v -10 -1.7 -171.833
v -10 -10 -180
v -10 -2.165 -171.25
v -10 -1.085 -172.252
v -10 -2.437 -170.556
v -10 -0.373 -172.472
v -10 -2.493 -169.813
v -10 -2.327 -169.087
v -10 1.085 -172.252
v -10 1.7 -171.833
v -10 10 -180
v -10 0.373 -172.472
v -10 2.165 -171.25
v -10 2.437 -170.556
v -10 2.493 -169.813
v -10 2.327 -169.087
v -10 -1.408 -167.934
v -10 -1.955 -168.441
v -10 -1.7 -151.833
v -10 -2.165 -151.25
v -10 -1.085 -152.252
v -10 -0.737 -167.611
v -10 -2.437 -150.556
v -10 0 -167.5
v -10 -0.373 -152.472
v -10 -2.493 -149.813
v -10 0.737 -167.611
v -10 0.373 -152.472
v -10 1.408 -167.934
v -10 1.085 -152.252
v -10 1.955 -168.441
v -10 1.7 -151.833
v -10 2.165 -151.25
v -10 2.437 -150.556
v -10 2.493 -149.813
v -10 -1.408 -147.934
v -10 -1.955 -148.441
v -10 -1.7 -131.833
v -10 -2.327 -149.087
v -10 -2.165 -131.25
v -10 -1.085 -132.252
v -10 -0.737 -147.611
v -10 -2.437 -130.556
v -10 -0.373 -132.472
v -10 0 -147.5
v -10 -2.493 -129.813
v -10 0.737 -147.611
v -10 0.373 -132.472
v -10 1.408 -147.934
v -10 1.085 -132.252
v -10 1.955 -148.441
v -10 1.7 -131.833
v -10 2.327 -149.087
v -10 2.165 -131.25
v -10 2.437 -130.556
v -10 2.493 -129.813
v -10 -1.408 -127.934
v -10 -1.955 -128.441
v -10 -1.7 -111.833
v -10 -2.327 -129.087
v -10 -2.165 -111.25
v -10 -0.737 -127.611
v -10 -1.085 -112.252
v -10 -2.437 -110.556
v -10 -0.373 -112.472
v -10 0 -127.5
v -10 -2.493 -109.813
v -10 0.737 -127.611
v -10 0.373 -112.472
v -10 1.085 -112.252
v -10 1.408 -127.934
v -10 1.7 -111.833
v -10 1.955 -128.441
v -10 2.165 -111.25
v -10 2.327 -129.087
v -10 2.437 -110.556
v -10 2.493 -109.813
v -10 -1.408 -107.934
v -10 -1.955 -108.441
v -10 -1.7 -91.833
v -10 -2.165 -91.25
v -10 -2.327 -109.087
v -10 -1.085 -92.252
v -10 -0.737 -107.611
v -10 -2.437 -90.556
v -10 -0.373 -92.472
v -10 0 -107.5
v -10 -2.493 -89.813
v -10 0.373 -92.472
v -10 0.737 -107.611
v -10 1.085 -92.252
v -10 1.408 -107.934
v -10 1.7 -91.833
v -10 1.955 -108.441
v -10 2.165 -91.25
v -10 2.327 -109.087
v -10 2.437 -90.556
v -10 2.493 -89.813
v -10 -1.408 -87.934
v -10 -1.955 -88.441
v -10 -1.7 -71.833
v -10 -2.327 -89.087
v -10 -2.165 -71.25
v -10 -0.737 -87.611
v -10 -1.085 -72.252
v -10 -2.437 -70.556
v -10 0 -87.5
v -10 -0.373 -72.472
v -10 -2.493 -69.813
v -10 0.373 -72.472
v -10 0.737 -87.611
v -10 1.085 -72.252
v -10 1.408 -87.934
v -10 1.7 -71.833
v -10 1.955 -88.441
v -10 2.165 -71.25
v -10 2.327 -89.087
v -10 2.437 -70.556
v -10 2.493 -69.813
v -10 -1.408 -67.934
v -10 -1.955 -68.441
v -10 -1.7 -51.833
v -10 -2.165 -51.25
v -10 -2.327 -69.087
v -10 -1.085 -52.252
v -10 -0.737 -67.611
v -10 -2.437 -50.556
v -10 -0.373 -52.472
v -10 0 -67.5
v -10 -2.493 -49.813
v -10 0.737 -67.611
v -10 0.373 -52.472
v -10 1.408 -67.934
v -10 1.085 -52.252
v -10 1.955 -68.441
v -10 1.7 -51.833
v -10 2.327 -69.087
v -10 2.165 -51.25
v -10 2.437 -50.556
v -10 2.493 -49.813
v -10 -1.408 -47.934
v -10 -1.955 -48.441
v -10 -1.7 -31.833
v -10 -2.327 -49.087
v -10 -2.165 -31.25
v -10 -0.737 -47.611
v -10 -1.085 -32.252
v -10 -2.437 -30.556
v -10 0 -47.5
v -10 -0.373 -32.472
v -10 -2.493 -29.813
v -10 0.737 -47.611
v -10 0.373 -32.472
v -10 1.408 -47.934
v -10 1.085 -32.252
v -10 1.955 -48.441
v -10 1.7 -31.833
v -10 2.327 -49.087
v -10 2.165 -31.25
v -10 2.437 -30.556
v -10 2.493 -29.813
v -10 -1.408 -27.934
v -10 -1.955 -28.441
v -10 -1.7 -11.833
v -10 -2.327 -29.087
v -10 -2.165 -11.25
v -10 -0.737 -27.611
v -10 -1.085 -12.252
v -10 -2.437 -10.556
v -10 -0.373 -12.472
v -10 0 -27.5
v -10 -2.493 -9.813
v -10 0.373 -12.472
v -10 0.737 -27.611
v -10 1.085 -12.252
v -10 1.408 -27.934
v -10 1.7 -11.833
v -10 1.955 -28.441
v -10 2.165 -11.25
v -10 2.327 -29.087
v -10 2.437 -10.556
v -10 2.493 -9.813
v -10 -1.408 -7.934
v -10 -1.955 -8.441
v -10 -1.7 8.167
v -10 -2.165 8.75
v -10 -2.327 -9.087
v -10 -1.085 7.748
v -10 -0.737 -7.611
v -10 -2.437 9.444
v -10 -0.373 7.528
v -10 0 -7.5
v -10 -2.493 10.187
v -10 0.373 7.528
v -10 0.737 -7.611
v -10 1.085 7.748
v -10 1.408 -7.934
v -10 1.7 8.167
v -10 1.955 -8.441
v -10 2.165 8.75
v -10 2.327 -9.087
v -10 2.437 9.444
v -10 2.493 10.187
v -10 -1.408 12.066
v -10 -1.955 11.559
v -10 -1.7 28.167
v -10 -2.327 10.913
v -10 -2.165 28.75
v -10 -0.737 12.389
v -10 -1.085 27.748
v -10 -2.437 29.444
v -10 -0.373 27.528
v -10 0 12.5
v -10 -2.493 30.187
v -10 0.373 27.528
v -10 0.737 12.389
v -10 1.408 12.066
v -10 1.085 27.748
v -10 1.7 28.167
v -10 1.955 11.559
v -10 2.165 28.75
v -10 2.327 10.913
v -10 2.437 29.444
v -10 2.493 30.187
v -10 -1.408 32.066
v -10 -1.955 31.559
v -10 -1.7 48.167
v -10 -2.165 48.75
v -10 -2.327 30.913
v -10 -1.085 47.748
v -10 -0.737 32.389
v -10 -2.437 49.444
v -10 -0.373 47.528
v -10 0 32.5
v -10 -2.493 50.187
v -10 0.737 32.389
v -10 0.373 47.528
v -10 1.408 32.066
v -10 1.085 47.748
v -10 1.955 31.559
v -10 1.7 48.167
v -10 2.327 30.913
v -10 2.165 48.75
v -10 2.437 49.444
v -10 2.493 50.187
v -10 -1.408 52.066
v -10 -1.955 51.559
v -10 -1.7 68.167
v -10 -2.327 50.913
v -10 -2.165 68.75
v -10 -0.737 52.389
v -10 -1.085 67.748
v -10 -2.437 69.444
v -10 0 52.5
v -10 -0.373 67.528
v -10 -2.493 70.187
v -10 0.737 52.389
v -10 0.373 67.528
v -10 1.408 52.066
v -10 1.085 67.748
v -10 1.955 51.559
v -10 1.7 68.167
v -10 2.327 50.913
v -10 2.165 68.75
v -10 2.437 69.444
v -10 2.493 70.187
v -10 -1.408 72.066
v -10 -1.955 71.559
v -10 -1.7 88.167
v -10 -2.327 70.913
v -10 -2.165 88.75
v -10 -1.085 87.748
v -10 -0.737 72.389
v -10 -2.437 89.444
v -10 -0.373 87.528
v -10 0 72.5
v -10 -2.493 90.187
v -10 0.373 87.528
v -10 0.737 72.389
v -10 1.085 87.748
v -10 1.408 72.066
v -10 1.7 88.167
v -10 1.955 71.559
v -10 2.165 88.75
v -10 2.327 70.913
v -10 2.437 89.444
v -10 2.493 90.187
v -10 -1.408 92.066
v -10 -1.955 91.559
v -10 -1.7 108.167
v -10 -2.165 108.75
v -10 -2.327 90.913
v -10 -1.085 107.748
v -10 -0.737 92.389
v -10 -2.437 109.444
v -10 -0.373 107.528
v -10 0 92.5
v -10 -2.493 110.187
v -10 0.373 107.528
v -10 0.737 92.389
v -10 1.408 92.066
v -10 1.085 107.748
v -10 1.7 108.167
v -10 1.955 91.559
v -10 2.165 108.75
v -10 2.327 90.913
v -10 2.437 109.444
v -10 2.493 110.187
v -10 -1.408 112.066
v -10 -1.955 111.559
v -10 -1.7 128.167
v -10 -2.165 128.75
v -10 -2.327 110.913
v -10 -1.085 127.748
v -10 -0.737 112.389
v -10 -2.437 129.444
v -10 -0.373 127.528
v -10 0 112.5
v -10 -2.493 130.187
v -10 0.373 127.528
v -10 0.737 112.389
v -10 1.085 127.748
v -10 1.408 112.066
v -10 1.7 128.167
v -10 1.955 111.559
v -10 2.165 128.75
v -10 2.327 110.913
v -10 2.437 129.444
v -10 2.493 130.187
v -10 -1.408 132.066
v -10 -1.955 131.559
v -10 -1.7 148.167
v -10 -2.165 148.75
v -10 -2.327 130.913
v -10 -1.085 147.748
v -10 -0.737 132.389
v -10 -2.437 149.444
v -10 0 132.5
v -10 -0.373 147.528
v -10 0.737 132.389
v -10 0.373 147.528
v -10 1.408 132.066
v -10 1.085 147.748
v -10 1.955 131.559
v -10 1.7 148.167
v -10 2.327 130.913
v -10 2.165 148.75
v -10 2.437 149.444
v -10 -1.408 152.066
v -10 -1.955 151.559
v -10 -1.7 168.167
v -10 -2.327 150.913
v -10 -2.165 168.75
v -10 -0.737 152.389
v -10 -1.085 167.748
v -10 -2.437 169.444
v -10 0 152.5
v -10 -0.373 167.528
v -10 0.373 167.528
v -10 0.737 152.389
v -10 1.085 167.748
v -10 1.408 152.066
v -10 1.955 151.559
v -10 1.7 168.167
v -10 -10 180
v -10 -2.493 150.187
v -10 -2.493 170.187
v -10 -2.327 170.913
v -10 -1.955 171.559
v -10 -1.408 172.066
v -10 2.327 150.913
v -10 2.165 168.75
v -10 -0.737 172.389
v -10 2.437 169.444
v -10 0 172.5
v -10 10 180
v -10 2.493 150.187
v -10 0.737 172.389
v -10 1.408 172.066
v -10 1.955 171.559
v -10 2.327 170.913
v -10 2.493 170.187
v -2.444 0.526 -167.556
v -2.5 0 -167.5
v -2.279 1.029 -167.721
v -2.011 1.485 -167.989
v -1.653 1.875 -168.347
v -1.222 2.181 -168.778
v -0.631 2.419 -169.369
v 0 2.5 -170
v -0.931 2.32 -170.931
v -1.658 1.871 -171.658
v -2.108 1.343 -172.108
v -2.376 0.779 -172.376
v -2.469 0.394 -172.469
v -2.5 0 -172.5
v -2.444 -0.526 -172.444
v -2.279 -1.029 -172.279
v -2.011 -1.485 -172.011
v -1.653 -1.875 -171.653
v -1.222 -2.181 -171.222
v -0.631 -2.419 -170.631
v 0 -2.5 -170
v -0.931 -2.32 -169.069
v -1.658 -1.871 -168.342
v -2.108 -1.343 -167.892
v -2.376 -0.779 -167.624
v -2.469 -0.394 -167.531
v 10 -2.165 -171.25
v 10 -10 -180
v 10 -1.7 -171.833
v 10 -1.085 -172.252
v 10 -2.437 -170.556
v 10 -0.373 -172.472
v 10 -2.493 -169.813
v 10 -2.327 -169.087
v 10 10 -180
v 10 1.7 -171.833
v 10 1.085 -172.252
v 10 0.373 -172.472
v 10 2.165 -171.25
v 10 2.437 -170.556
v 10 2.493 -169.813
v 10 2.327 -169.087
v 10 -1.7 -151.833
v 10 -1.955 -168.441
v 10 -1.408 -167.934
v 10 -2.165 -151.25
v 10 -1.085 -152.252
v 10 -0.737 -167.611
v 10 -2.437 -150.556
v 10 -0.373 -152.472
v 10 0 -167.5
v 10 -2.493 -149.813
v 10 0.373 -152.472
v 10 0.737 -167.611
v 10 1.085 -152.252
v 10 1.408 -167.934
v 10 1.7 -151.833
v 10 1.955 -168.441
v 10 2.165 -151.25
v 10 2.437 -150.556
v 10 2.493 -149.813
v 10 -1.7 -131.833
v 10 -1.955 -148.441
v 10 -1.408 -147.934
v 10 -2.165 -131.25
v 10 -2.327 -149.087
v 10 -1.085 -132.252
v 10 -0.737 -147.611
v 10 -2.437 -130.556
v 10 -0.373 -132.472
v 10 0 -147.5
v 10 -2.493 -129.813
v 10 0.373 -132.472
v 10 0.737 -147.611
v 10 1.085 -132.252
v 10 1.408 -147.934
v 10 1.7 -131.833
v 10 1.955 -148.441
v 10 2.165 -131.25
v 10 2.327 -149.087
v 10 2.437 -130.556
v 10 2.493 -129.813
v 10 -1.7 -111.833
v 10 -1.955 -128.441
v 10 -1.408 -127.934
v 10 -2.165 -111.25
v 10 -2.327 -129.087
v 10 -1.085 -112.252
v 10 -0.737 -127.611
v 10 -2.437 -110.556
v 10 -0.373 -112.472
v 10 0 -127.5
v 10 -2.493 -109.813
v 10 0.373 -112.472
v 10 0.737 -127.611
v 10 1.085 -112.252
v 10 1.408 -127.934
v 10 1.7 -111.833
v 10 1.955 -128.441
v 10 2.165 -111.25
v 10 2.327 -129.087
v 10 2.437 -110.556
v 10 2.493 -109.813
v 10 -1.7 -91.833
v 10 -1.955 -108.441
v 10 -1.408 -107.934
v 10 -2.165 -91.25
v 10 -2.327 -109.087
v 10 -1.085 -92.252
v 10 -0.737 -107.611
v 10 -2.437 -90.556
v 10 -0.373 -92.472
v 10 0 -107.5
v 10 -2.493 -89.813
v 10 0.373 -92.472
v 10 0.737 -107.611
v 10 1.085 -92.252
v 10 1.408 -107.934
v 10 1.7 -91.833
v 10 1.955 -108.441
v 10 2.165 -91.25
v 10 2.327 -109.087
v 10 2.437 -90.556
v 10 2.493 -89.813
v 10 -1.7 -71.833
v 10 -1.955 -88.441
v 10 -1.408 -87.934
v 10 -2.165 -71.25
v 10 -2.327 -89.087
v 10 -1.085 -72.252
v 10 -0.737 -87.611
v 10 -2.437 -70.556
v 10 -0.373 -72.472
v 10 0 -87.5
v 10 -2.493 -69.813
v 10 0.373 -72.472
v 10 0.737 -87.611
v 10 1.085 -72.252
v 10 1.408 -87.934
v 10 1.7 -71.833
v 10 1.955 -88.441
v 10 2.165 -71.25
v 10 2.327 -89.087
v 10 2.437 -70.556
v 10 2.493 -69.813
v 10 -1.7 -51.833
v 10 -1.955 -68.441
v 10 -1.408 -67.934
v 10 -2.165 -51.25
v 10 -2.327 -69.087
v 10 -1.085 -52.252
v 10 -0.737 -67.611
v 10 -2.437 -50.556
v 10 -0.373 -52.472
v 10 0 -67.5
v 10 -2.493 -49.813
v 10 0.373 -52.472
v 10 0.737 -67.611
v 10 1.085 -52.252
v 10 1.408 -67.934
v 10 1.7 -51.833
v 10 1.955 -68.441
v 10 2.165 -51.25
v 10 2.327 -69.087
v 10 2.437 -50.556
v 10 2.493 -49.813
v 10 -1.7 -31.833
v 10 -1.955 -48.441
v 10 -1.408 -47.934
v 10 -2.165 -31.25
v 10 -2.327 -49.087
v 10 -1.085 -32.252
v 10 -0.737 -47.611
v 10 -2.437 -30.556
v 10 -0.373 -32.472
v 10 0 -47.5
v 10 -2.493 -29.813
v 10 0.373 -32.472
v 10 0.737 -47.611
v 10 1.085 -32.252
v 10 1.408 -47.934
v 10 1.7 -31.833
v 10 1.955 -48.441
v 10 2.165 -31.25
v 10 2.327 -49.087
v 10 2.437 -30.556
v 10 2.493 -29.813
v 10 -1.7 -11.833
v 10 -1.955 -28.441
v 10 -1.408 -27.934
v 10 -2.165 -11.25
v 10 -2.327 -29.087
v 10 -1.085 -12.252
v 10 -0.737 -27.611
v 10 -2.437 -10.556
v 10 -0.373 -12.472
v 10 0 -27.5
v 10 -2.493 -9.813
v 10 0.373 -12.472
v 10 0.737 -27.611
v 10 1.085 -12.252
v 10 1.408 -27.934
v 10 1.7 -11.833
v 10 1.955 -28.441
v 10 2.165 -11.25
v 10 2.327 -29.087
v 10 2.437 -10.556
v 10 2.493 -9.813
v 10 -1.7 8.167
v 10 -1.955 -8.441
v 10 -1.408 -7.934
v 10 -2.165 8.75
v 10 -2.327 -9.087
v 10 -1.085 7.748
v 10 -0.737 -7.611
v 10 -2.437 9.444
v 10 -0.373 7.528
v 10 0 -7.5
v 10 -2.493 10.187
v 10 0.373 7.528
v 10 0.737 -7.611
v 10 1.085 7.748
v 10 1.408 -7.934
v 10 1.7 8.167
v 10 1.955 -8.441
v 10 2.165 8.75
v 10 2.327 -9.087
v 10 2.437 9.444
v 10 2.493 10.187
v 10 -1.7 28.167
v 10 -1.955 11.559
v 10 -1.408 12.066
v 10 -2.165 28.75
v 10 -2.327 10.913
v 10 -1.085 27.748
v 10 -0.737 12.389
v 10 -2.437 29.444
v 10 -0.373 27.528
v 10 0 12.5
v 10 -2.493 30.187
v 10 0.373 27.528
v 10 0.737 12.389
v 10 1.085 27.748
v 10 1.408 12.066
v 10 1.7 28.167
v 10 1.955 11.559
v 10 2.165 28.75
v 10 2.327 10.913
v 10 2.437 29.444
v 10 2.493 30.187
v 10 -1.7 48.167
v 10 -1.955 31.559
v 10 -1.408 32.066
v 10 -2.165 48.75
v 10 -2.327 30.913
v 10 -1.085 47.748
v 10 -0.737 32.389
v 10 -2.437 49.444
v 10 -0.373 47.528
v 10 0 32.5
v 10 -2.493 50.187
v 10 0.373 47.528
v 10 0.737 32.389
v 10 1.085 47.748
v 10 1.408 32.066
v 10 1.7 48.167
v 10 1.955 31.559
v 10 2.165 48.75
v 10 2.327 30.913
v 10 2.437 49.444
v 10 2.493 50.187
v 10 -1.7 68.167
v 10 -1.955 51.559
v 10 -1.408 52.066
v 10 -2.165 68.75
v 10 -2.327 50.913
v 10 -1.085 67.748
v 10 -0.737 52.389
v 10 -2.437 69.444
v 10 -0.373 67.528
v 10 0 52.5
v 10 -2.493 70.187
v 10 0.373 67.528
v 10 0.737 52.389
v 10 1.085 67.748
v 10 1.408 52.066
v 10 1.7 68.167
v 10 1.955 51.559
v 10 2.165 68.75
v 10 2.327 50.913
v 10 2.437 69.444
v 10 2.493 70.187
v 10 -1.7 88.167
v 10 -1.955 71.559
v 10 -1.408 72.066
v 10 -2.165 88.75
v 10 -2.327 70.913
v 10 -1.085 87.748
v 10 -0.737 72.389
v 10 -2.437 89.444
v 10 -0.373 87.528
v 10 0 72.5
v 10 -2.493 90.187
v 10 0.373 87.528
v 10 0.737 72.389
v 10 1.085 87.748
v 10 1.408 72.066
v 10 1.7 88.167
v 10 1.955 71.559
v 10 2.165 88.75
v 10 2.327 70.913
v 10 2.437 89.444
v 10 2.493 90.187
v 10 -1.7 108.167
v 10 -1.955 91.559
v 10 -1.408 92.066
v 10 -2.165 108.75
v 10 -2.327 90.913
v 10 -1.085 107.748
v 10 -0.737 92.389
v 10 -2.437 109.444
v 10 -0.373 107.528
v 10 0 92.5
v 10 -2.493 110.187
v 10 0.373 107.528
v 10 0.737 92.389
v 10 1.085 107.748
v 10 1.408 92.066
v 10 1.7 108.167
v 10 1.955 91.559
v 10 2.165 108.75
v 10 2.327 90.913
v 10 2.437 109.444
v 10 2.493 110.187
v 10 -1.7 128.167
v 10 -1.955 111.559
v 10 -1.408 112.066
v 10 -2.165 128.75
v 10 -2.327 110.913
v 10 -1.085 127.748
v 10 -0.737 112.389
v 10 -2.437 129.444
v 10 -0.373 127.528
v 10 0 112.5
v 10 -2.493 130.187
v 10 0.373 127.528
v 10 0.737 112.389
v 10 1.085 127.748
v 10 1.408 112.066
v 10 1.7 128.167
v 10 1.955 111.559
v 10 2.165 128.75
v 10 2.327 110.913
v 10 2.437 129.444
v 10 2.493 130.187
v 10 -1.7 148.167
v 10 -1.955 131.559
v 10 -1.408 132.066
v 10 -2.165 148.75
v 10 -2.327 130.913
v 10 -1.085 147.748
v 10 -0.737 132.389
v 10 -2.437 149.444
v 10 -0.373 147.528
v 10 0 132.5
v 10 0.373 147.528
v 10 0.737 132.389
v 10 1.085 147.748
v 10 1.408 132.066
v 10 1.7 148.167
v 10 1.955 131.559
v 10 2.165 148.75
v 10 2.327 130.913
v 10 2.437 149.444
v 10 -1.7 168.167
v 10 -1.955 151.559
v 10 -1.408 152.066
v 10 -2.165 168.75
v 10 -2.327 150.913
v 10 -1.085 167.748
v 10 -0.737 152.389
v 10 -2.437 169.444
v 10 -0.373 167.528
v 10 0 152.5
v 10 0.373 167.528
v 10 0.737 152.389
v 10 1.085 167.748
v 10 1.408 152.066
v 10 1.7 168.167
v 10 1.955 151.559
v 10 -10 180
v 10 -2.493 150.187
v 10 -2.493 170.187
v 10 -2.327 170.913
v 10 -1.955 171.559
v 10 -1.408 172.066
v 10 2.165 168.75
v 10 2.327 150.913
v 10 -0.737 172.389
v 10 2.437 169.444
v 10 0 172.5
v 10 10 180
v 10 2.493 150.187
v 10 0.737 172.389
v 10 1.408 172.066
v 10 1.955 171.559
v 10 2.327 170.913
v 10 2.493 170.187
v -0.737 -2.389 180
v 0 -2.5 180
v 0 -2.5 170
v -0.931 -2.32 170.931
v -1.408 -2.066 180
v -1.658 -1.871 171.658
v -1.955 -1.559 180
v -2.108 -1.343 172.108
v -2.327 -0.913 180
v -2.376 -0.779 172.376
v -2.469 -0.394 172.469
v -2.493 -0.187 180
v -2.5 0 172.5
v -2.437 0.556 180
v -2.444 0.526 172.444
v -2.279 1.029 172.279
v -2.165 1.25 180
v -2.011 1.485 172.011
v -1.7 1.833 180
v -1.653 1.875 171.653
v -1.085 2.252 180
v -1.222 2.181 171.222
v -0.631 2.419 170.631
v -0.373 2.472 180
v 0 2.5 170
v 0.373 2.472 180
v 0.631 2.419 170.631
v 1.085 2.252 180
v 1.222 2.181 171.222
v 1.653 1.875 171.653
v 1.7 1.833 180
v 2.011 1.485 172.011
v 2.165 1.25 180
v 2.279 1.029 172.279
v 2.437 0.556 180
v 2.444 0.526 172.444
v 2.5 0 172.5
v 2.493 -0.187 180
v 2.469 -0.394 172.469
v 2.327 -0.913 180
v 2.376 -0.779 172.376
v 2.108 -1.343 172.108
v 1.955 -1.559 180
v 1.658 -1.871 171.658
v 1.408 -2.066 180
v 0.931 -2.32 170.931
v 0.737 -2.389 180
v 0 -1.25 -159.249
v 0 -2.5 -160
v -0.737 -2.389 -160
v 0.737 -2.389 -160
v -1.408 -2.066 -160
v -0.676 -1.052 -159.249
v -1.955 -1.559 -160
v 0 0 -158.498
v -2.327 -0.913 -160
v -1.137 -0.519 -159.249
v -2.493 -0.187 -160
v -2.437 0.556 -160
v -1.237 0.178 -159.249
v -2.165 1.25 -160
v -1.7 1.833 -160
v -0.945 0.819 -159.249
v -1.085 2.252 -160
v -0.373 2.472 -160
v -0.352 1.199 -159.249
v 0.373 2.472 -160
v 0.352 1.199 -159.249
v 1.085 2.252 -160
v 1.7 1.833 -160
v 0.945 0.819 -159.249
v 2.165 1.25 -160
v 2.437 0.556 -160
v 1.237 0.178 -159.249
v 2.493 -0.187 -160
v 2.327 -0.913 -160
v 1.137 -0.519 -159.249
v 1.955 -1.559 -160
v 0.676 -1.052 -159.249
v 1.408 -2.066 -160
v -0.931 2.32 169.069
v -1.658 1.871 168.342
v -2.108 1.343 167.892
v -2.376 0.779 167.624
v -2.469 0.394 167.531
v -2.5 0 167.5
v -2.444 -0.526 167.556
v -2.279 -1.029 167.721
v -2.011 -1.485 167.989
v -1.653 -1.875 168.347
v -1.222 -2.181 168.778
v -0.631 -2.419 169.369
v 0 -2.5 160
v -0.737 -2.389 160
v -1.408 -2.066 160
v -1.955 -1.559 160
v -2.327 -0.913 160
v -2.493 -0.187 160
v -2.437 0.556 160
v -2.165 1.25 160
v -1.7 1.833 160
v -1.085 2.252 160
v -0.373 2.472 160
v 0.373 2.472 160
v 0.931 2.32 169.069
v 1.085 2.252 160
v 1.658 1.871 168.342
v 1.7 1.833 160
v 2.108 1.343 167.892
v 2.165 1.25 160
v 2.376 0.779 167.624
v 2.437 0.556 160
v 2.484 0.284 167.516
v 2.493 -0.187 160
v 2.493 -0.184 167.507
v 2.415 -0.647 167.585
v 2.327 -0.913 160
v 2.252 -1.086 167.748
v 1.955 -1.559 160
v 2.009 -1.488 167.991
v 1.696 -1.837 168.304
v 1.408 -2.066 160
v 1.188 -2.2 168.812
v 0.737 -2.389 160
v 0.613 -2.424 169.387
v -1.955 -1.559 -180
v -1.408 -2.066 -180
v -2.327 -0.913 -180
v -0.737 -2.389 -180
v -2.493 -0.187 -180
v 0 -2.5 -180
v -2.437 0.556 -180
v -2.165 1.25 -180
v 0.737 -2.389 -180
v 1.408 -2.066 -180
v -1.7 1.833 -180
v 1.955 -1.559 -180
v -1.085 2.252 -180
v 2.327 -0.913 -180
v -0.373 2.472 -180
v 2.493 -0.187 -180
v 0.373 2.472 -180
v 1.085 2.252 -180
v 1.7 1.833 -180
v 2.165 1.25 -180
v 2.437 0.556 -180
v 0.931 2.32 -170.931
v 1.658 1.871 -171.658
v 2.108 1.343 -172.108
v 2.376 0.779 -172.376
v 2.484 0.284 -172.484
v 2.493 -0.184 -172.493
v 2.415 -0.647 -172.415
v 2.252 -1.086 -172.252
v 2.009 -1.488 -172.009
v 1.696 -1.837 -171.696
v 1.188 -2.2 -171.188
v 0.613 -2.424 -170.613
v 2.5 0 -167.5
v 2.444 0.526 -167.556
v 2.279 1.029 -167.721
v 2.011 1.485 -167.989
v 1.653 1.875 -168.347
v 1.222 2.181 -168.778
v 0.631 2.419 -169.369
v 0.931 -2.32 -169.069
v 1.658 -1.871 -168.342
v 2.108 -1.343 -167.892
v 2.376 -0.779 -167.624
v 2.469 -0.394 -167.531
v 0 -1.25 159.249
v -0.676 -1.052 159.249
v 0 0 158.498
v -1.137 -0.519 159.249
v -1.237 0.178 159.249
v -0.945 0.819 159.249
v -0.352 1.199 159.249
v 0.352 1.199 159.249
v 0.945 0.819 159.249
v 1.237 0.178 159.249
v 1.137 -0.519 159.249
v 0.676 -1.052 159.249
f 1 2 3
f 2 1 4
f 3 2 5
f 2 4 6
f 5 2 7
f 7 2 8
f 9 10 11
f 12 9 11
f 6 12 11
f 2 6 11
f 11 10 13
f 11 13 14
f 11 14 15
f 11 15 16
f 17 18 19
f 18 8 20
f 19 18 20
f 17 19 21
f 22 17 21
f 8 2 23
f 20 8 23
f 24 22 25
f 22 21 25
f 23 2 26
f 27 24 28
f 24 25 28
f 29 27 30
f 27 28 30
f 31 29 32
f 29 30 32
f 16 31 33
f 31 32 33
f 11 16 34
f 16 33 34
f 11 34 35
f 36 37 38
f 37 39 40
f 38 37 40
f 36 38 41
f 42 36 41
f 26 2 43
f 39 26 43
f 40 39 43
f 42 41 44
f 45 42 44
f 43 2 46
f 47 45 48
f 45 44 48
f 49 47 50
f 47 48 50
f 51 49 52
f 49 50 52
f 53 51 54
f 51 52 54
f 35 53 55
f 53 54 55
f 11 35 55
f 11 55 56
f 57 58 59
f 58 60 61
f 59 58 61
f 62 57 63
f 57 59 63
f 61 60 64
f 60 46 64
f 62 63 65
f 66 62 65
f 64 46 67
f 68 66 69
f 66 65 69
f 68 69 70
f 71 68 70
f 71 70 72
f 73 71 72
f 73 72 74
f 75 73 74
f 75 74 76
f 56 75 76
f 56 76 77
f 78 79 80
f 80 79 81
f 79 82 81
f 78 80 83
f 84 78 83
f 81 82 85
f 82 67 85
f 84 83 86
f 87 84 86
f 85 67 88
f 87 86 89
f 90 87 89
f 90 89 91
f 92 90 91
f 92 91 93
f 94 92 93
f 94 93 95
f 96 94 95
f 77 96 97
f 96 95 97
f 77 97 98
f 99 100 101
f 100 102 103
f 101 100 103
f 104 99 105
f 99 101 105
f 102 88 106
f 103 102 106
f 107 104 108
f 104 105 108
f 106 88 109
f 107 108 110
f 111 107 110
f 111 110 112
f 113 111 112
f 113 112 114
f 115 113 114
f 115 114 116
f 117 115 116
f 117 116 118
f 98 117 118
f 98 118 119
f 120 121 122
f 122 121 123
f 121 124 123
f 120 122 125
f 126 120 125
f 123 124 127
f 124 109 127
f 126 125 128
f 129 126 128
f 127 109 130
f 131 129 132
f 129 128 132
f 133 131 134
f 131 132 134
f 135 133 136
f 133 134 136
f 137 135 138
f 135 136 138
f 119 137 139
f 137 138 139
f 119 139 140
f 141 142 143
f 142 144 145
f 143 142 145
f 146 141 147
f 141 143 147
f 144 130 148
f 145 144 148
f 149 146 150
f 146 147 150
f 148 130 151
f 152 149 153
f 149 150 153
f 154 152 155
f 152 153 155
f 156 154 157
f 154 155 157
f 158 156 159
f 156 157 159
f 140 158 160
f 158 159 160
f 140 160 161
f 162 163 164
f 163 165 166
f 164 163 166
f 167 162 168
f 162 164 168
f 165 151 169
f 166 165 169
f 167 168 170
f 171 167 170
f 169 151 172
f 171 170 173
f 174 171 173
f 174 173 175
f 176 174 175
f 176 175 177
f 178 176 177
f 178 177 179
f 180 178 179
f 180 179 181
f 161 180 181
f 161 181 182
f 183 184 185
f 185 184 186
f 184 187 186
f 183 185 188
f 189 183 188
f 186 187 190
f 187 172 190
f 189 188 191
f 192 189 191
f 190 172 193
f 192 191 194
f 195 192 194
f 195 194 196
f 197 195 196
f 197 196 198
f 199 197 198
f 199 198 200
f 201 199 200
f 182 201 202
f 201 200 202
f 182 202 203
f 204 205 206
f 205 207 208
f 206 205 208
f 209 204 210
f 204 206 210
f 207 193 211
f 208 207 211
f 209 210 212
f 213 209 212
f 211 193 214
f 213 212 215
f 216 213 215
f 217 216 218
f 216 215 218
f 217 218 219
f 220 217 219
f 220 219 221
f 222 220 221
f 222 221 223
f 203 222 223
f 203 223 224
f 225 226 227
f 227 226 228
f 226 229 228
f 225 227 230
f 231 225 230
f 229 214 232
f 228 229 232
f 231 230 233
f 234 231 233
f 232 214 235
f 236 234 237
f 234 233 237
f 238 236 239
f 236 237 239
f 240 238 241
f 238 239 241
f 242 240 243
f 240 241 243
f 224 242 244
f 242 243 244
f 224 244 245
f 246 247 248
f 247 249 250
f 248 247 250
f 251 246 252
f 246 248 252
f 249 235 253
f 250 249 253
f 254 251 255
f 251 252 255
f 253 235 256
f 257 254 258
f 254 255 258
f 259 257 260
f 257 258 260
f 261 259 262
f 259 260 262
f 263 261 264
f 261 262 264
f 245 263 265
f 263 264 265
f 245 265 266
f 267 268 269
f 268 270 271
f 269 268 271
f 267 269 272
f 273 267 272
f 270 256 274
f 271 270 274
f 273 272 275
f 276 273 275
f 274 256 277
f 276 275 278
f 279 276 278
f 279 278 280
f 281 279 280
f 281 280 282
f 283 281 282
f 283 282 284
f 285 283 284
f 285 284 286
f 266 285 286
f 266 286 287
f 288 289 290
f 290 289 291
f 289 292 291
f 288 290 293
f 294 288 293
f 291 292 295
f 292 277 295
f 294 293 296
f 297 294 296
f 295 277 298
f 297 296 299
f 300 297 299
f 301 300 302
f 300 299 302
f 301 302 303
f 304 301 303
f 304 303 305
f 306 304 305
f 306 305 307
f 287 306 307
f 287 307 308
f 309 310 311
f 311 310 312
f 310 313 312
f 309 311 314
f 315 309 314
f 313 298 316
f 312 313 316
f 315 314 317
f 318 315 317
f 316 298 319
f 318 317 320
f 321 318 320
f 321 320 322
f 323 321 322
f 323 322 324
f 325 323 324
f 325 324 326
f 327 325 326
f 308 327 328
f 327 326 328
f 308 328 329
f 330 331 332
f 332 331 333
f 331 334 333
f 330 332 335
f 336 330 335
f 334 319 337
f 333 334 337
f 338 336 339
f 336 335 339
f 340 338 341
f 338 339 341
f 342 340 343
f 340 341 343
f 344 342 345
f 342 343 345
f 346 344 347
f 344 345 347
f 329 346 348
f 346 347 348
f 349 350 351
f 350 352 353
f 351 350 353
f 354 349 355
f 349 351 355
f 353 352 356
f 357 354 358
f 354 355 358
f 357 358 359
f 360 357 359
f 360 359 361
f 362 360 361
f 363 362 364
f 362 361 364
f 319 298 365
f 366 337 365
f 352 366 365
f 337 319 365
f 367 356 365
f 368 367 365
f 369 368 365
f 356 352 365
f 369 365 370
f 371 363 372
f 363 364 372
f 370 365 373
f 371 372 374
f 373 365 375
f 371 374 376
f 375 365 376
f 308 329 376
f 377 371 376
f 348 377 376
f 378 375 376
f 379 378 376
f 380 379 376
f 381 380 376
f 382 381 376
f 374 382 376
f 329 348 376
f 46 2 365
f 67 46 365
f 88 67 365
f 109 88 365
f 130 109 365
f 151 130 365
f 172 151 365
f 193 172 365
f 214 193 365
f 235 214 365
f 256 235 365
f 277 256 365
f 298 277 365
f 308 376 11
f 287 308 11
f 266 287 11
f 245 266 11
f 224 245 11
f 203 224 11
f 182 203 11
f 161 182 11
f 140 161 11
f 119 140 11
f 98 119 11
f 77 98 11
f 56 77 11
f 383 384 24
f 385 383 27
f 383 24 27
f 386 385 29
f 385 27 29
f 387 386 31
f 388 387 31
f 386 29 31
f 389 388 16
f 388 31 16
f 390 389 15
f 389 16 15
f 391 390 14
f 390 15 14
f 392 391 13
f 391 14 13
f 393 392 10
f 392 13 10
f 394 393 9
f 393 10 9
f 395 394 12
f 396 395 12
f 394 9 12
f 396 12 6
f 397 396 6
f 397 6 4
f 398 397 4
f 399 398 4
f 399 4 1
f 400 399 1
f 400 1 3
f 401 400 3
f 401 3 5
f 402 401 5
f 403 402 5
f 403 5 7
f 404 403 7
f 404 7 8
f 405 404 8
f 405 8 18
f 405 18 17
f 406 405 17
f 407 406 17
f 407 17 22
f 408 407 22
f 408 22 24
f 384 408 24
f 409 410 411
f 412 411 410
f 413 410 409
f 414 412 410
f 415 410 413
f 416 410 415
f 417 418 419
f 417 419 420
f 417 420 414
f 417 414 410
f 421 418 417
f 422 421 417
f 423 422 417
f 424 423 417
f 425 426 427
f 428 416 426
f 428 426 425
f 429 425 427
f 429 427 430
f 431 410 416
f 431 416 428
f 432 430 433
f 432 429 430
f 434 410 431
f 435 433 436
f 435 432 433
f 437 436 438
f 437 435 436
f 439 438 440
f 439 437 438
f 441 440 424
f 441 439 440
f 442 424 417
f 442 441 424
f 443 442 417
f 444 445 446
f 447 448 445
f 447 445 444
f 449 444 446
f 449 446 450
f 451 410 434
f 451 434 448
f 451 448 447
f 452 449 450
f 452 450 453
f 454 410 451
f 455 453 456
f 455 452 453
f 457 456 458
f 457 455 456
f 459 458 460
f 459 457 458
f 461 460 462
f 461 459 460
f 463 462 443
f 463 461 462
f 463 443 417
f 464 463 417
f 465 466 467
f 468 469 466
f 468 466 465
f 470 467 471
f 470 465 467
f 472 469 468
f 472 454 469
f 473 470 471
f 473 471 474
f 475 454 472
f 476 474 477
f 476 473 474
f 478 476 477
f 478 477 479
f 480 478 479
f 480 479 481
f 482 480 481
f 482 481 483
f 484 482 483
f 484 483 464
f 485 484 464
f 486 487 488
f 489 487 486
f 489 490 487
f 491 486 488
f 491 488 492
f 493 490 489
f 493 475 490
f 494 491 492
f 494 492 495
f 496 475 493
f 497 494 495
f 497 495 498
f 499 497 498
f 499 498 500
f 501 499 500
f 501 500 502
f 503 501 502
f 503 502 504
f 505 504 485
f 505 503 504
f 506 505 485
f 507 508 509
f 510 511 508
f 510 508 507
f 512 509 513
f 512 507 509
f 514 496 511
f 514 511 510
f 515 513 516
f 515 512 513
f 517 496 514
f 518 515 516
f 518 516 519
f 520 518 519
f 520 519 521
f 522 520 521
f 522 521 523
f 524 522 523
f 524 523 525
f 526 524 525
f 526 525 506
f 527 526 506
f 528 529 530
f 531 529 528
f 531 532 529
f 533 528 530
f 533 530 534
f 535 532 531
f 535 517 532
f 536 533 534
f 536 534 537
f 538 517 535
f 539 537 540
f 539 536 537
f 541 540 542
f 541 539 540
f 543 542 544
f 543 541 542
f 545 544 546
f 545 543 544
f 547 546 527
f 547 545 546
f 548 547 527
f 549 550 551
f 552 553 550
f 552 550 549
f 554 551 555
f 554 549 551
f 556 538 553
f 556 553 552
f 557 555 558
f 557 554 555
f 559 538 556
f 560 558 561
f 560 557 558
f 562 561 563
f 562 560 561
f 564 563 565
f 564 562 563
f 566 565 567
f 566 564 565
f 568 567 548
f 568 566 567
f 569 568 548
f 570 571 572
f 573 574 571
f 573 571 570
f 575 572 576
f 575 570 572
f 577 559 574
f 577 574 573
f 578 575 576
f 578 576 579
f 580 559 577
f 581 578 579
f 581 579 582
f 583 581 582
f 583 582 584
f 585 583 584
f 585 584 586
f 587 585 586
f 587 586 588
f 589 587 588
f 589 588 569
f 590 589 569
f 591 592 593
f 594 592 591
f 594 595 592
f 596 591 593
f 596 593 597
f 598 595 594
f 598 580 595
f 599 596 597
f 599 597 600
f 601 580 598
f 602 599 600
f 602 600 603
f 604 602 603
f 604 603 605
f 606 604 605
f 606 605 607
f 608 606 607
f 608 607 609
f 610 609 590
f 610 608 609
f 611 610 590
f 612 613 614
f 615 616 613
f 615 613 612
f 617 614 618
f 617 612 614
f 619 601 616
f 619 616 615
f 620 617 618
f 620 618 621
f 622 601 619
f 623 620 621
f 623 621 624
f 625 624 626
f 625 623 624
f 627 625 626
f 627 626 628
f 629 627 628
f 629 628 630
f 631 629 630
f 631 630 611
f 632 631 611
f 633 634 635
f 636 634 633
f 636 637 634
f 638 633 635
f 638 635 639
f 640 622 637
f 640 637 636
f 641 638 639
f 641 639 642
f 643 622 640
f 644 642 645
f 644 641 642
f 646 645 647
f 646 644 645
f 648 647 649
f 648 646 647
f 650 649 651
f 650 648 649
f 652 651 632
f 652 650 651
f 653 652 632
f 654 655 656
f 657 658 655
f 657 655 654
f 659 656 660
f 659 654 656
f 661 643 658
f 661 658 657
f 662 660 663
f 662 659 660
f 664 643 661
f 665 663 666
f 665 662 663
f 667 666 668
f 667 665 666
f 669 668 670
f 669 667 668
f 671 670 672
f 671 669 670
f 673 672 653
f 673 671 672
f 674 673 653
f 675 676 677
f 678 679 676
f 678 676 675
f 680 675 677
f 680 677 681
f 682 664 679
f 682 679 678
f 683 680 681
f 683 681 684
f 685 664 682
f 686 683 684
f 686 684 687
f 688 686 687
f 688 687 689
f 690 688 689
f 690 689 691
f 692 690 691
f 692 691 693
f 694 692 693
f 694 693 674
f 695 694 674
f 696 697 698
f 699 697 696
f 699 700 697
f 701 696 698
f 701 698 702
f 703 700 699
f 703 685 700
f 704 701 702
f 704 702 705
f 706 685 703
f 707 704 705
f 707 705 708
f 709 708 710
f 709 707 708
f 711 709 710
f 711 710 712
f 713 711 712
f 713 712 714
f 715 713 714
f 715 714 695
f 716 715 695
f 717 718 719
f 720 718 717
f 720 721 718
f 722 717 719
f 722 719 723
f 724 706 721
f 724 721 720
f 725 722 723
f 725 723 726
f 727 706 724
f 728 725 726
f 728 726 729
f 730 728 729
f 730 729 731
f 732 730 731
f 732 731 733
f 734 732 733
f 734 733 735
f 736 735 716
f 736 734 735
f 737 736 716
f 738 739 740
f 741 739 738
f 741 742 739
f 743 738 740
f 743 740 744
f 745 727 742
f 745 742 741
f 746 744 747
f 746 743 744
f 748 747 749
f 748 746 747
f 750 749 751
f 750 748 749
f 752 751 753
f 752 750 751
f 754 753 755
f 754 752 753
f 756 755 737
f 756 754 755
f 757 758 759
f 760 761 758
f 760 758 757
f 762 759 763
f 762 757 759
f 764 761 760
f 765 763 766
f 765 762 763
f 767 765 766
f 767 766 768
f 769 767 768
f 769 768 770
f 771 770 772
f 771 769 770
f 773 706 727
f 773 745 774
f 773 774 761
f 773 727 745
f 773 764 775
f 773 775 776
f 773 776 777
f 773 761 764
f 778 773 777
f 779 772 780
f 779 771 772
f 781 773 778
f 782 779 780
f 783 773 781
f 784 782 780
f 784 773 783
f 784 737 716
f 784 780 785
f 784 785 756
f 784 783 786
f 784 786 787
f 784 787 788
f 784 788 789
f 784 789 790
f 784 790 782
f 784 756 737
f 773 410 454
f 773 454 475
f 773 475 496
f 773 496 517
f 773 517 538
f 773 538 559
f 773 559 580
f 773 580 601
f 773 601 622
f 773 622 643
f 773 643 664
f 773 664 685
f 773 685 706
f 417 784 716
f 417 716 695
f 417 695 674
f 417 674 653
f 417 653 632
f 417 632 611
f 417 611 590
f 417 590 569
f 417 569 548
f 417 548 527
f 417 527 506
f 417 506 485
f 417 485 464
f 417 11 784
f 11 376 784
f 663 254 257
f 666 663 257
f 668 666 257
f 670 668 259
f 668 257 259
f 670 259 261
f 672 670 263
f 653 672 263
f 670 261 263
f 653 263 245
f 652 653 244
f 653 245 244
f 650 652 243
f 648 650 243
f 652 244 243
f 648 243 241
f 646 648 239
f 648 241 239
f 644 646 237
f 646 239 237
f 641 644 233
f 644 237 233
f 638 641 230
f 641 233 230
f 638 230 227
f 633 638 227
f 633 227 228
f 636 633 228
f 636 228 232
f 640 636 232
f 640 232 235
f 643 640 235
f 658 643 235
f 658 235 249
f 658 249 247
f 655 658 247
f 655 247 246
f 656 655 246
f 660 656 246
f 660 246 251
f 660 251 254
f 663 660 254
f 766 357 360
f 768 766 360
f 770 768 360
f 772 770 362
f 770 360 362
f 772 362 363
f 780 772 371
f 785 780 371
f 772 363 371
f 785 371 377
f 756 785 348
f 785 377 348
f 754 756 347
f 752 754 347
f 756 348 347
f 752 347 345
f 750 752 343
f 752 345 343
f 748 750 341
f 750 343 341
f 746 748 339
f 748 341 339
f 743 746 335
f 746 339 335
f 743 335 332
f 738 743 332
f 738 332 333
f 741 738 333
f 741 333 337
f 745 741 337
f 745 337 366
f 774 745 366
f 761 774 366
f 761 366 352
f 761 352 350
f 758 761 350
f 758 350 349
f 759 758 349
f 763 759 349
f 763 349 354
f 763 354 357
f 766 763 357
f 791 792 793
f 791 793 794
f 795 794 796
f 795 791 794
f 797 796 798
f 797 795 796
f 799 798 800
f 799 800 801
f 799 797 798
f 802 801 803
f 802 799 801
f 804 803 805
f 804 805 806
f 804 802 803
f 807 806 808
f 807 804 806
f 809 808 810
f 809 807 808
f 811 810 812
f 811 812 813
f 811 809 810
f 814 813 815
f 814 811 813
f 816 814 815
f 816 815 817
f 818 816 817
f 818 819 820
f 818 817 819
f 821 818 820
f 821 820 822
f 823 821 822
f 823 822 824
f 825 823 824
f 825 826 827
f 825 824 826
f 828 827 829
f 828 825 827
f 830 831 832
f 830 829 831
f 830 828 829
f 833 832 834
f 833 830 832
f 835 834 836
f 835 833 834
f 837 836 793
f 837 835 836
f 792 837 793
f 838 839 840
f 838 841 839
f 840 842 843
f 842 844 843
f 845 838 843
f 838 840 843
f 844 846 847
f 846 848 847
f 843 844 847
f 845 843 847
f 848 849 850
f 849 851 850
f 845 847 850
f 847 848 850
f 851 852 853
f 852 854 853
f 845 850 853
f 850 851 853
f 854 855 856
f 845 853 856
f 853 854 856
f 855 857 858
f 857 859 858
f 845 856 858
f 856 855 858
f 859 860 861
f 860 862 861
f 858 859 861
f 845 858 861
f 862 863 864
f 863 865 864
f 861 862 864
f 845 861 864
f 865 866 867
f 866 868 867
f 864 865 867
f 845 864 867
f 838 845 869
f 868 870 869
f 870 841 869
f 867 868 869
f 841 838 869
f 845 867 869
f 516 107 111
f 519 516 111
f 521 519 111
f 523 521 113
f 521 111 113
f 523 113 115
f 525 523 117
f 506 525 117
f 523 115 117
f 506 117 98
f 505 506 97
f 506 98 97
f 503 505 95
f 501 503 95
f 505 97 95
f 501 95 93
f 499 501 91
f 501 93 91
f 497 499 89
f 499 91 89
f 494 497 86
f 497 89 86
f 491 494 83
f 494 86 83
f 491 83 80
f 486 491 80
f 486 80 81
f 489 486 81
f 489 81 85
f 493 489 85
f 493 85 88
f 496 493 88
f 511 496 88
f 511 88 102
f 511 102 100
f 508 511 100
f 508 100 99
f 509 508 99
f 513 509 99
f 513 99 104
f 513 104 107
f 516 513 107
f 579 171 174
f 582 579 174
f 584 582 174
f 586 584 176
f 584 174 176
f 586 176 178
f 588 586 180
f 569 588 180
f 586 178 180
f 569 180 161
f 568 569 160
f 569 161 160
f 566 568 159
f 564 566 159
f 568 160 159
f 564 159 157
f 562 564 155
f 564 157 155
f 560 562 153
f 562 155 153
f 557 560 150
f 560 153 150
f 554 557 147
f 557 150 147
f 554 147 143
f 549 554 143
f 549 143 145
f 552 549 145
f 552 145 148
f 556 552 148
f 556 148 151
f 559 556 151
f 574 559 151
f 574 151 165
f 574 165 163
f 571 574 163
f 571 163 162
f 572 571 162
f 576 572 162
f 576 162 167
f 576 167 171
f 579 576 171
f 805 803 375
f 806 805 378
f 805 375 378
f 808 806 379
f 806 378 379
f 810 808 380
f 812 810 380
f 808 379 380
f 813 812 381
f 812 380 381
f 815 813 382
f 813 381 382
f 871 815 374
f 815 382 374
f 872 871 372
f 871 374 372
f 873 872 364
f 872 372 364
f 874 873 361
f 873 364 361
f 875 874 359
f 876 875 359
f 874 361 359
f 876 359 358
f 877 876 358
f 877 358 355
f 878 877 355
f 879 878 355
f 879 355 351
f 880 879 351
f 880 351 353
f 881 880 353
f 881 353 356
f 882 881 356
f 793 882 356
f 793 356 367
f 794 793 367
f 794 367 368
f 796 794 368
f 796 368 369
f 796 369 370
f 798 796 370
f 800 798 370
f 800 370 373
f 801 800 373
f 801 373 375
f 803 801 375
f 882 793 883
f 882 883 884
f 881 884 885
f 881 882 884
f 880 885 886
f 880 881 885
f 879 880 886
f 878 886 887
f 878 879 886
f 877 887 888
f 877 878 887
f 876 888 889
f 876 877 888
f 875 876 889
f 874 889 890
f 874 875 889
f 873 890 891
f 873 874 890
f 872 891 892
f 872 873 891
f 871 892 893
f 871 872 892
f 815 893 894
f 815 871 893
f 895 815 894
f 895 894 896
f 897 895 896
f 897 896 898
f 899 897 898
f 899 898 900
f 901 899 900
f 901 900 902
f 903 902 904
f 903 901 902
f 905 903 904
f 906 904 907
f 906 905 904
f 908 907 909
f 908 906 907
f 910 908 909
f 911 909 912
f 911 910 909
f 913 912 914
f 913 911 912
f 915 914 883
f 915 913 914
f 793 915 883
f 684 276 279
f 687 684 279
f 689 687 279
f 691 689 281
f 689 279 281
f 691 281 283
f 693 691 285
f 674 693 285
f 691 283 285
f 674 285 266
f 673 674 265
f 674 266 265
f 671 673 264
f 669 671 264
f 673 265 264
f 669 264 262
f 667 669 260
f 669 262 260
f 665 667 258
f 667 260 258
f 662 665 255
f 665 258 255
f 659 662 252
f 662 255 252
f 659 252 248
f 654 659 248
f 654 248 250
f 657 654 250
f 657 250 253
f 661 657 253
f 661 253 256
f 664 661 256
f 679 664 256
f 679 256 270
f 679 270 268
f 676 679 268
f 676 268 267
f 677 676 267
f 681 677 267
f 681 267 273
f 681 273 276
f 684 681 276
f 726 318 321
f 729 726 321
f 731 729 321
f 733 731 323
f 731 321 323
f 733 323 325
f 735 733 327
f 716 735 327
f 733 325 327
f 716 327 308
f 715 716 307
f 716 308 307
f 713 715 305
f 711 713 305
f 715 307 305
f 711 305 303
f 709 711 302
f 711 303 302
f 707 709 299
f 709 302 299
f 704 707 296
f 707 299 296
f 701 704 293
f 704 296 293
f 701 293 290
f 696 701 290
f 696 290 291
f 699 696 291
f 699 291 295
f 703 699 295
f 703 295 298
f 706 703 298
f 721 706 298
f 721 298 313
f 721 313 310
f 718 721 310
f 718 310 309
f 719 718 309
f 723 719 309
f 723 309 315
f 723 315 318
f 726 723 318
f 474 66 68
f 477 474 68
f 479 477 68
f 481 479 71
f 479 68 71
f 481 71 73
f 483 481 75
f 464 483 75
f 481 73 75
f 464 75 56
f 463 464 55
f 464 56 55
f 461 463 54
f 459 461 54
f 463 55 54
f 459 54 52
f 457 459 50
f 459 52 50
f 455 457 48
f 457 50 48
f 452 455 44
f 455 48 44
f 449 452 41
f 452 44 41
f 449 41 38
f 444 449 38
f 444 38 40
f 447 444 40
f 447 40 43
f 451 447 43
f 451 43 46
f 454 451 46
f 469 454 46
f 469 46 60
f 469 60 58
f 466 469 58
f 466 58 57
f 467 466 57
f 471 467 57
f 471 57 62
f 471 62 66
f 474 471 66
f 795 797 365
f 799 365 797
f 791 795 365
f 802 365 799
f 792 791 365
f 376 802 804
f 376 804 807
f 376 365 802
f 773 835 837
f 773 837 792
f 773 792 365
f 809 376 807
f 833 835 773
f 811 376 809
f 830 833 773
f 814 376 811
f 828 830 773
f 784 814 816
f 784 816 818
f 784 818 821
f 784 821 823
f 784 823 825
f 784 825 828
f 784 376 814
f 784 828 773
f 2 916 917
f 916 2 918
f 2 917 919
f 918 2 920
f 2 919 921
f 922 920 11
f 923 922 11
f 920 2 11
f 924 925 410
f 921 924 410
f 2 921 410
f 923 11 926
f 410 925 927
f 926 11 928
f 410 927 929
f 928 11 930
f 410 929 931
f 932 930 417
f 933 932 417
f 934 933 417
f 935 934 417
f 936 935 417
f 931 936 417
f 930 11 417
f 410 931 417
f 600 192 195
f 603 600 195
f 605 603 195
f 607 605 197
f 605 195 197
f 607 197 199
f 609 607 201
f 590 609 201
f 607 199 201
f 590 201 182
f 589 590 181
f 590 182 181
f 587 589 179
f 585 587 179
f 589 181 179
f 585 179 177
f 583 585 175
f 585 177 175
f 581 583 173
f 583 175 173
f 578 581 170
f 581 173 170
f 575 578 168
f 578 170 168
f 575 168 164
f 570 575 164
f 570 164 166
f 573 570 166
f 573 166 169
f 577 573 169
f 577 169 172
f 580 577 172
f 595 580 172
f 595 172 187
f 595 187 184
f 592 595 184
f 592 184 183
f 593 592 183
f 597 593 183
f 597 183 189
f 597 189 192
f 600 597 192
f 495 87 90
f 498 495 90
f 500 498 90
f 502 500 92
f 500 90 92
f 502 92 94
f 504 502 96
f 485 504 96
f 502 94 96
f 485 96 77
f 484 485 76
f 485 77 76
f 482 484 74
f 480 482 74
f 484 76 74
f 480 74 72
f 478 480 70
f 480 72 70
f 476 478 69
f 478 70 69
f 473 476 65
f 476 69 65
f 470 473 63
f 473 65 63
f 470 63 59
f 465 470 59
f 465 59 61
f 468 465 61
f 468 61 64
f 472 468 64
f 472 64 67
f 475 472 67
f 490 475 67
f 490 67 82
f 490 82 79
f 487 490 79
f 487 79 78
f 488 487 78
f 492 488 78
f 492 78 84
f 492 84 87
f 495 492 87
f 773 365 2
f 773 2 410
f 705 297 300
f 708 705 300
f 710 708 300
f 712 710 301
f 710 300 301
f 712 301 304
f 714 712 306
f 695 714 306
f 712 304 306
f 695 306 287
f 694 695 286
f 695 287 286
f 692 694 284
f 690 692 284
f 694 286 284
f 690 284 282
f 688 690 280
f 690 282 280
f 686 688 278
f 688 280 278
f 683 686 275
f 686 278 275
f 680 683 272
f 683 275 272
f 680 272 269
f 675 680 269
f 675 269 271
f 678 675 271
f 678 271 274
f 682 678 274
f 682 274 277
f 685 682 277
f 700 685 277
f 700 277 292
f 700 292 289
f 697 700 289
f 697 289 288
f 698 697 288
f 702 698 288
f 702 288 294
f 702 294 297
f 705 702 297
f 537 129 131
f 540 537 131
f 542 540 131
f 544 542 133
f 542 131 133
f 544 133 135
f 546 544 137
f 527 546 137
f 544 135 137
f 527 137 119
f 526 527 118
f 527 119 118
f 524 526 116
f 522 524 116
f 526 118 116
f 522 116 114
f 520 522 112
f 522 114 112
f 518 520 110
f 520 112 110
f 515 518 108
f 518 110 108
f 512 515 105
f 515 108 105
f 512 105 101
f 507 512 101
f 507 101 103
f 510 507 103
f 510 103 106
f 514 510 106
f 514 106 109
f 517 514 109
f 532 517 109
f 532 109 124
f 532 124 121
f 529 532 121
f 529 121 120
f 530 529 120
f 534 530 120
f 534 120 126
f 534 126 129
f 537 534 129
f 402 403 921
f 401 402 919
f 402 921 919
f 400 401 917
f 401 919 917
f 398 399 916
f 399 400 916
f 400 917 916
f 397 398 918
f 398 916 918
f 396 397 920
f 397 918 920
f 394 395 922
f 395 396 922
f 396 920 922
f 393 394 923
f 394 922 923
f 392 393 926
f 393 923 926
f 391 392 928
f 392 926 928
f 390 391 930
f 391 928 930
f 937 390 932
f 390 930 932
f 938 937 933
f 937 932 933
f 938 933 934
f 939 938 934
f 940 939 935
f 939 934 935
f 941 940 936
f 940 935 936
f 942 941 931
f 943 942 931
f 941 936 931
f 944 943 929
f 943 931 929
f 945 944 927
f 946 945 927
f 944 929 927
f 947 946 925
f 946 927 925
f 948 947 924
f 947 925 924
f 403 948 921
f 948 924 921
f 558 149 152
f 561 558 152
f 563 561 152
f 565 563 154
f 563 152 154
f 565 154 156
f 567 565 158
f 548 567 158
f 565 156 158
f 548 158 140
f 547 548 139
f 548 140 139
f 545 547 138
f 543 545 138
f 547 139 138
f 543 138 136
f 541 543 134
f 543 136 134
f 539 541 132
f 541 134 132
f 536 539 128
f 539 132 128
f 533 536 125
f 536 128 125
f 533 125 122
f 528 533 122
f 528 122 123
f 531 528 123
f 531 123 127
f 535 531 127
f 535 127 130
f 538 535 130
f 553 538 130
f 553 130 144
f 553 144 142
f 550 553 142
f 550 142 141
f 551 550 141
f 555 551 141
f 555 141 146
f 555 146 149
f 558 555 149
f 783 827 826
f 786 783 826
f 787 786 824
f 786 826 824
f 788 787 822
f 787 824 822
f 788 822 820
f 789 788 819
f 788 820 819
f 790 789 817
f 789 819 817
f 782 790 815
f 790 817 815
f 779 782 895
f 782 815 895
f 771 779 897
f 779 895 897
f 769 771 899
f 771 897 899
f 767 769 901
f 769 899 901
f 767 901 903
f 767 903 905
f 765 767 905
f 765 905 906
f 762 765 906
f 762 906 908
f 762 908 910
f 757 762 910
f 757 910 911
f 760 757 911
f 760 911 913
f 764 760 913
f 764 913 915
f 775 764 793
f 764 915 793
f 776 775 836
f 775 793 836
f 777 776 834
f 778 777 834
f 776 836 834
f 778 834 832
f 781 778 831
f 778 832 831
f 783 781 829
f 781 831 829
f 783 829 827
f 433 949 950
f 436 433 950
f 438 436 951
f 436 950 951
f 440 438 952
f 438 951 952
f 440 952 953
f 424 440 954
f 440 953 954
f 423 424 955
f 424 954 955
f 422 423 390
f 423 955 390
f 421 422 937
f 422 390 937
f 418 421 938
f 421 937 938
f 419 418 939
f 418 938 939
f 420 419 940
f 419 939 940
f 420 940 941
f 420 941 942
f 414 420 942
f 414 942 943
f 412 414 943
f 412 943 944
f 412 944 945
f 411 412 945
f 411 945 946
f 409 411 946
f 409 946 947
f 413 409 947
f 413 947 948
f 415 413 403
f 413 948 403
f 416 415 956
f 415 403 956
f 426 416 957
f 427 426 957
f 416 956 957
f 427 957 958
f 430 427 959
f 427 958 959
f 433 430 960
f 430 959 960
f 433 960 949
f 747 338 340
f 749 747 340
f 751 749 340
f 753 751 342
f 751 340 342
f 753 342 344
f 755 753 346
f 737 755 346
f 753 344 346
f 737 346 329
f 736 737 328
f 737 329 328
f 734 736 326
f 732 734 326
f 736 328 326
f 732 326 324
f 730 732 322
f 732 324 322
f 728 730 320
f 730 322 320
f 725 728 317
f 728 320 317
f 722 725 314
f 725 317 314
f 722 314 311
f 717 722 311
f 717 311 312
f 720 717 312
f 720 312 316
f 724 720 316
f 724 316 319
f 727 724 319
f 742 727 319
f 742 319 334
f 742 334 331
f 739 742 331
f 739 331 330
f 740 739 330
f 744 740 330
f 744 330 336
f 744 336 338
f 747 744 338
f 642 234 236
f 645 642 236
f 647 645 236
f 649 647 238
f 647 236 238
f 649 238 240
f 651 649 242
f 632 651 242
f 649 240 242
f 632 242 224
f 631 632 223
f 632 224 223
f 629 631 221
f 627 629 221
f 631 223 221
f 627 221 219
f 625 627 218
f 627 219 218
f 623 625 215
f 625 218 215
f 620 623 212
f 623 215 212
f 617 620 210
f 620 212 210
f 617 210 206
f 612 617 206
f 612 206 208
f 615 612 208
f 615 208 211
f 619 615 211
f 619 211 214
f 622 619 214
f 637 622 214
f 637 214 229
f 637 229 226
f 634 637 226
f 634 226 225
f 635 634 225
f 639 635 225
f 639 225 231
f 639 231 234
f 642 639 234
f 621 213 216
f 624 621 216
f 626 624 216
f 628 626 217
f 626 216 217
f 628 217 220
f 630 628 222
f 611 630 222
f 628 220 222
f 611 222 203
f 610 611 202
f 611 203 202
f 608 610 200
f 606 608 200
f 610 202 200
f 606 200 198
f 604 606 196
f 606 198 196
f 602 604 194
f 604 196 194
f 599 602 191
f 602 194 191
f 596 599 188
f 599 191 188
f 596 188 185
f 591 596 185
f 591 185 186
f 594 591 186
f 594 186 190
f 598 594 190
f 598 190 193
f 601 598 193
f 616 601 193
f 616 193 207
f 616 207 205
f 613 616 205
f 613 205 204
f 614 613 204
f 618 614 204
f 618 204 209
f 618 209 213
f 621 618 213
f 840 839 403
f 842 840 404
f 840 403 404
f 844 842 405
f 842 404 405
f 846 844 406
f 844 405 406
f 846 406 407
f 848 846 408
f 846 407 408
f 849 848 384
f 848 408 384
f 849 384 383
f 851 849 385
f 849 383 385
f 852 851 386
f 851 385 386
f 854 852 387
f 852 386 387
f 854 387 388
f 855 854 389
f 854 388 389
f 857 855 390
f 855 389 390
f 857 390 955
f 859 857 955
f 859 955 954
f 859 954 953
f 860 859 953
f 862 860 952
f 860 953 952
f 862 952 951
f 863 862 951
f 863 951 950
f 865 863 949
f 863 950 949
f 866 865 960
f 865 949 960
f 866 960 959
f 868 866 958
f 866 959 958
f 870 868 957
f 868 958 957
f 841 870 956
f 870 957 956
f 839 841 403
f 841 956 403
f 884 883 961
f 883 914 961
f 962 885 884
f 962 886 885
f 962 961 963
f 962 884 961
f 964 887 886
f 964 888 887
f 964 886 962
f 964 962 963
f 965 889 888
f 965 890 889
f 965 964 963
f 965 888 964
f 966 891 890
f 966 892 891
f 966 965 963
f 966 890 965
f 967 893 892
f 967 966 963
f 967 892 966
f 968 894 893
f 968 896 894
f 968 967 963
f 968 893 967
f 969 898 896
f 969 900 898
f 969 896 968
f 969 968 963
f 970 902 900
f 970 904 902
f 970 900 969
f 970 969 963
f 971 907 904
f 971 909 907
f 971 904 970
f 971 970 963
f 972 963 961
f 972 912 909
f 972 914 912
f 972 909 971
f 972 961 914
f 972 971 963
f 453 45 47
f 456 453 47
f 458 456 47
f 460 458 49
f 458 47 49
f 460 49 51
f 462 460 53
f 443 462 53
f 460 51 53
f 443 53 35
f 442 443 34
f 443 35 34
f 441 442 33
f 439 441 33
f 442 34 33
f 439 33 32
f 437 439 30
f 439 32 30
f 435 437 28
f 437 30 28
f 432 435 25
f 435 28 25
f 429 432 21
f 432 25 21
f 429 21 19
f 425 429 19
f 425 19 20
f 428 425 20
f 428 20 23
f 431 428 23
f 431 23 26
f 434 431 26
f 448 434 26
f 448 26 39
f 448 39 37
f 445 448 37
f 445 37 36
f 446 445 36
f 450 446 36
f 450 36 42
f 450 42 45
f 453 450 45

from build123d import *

# Parameters (mm, degrees)
SKETCH1_W             = 20
SKETCH1_H             = 20
BOSS_EXTRUDE1_DEPTH   = 180
F_5_0MM_DOWEL_HOLE1_D = 5
LPATTERN2_COUNT       = 18
LPATTERN2_PITCH       = 20


with BuildPart() as part:
    # Sketch1 → Boss-Extrude1 (new, symmetric)
    with BuildSketch(Plane.XY):
        Rectangle(SKETCH1_W, SKETCH1_H)
    extrude(amount=BOSS_EXTRUDE1_DEPTH, both=True)

    # Ø5.0mm Dowel Hole1 (through all)
    with Locations(Plane(origin=(10, 0, 0), x_dir=(0, 0, -1), z_dir=(1, 0, 0))):
        with Locations((170, 0)):
            f_5_0mm_dowel_hole1 = Hole(F_5_0MM_DOWEL_HOLE1_D / 2)

    # LPattern2: Ø5.0mm Dowel Hole1 ×18
    with Locations(*[(0, 0, i * LPATTERN2_PITCH) for i in range(1, LPATTERN2_COUNT)]):
        add(f_5_0mm_dowel_hole1, mode=Mode.SUBTRACT)

    # Sketch5 → Ø5.0mm Dowel Hole2 (revolve, cut)
    with BuildSketch(Plane(origin=(0, 0, 180), x_dir=(0, -1, 0), z_dir=(1, 0, 0))):
        Polygon((0, 0), (0, 21.502151548), (2.5, 20), (2.5, 0), align=None)
    f_5_0mm_dowel_hole2 = revolve(axis=Axis((0, 0, 186.35), (0, 0, -1)), mode=Mode.SUBTRACT)

    # Mirror1: Ø5.0mm Dowel Hole2 across plane
    add(f_5_0mm_dowel_hole2.mirror(Plane.XY), mode=Mode.SUBTRACT)


solid = part.part
